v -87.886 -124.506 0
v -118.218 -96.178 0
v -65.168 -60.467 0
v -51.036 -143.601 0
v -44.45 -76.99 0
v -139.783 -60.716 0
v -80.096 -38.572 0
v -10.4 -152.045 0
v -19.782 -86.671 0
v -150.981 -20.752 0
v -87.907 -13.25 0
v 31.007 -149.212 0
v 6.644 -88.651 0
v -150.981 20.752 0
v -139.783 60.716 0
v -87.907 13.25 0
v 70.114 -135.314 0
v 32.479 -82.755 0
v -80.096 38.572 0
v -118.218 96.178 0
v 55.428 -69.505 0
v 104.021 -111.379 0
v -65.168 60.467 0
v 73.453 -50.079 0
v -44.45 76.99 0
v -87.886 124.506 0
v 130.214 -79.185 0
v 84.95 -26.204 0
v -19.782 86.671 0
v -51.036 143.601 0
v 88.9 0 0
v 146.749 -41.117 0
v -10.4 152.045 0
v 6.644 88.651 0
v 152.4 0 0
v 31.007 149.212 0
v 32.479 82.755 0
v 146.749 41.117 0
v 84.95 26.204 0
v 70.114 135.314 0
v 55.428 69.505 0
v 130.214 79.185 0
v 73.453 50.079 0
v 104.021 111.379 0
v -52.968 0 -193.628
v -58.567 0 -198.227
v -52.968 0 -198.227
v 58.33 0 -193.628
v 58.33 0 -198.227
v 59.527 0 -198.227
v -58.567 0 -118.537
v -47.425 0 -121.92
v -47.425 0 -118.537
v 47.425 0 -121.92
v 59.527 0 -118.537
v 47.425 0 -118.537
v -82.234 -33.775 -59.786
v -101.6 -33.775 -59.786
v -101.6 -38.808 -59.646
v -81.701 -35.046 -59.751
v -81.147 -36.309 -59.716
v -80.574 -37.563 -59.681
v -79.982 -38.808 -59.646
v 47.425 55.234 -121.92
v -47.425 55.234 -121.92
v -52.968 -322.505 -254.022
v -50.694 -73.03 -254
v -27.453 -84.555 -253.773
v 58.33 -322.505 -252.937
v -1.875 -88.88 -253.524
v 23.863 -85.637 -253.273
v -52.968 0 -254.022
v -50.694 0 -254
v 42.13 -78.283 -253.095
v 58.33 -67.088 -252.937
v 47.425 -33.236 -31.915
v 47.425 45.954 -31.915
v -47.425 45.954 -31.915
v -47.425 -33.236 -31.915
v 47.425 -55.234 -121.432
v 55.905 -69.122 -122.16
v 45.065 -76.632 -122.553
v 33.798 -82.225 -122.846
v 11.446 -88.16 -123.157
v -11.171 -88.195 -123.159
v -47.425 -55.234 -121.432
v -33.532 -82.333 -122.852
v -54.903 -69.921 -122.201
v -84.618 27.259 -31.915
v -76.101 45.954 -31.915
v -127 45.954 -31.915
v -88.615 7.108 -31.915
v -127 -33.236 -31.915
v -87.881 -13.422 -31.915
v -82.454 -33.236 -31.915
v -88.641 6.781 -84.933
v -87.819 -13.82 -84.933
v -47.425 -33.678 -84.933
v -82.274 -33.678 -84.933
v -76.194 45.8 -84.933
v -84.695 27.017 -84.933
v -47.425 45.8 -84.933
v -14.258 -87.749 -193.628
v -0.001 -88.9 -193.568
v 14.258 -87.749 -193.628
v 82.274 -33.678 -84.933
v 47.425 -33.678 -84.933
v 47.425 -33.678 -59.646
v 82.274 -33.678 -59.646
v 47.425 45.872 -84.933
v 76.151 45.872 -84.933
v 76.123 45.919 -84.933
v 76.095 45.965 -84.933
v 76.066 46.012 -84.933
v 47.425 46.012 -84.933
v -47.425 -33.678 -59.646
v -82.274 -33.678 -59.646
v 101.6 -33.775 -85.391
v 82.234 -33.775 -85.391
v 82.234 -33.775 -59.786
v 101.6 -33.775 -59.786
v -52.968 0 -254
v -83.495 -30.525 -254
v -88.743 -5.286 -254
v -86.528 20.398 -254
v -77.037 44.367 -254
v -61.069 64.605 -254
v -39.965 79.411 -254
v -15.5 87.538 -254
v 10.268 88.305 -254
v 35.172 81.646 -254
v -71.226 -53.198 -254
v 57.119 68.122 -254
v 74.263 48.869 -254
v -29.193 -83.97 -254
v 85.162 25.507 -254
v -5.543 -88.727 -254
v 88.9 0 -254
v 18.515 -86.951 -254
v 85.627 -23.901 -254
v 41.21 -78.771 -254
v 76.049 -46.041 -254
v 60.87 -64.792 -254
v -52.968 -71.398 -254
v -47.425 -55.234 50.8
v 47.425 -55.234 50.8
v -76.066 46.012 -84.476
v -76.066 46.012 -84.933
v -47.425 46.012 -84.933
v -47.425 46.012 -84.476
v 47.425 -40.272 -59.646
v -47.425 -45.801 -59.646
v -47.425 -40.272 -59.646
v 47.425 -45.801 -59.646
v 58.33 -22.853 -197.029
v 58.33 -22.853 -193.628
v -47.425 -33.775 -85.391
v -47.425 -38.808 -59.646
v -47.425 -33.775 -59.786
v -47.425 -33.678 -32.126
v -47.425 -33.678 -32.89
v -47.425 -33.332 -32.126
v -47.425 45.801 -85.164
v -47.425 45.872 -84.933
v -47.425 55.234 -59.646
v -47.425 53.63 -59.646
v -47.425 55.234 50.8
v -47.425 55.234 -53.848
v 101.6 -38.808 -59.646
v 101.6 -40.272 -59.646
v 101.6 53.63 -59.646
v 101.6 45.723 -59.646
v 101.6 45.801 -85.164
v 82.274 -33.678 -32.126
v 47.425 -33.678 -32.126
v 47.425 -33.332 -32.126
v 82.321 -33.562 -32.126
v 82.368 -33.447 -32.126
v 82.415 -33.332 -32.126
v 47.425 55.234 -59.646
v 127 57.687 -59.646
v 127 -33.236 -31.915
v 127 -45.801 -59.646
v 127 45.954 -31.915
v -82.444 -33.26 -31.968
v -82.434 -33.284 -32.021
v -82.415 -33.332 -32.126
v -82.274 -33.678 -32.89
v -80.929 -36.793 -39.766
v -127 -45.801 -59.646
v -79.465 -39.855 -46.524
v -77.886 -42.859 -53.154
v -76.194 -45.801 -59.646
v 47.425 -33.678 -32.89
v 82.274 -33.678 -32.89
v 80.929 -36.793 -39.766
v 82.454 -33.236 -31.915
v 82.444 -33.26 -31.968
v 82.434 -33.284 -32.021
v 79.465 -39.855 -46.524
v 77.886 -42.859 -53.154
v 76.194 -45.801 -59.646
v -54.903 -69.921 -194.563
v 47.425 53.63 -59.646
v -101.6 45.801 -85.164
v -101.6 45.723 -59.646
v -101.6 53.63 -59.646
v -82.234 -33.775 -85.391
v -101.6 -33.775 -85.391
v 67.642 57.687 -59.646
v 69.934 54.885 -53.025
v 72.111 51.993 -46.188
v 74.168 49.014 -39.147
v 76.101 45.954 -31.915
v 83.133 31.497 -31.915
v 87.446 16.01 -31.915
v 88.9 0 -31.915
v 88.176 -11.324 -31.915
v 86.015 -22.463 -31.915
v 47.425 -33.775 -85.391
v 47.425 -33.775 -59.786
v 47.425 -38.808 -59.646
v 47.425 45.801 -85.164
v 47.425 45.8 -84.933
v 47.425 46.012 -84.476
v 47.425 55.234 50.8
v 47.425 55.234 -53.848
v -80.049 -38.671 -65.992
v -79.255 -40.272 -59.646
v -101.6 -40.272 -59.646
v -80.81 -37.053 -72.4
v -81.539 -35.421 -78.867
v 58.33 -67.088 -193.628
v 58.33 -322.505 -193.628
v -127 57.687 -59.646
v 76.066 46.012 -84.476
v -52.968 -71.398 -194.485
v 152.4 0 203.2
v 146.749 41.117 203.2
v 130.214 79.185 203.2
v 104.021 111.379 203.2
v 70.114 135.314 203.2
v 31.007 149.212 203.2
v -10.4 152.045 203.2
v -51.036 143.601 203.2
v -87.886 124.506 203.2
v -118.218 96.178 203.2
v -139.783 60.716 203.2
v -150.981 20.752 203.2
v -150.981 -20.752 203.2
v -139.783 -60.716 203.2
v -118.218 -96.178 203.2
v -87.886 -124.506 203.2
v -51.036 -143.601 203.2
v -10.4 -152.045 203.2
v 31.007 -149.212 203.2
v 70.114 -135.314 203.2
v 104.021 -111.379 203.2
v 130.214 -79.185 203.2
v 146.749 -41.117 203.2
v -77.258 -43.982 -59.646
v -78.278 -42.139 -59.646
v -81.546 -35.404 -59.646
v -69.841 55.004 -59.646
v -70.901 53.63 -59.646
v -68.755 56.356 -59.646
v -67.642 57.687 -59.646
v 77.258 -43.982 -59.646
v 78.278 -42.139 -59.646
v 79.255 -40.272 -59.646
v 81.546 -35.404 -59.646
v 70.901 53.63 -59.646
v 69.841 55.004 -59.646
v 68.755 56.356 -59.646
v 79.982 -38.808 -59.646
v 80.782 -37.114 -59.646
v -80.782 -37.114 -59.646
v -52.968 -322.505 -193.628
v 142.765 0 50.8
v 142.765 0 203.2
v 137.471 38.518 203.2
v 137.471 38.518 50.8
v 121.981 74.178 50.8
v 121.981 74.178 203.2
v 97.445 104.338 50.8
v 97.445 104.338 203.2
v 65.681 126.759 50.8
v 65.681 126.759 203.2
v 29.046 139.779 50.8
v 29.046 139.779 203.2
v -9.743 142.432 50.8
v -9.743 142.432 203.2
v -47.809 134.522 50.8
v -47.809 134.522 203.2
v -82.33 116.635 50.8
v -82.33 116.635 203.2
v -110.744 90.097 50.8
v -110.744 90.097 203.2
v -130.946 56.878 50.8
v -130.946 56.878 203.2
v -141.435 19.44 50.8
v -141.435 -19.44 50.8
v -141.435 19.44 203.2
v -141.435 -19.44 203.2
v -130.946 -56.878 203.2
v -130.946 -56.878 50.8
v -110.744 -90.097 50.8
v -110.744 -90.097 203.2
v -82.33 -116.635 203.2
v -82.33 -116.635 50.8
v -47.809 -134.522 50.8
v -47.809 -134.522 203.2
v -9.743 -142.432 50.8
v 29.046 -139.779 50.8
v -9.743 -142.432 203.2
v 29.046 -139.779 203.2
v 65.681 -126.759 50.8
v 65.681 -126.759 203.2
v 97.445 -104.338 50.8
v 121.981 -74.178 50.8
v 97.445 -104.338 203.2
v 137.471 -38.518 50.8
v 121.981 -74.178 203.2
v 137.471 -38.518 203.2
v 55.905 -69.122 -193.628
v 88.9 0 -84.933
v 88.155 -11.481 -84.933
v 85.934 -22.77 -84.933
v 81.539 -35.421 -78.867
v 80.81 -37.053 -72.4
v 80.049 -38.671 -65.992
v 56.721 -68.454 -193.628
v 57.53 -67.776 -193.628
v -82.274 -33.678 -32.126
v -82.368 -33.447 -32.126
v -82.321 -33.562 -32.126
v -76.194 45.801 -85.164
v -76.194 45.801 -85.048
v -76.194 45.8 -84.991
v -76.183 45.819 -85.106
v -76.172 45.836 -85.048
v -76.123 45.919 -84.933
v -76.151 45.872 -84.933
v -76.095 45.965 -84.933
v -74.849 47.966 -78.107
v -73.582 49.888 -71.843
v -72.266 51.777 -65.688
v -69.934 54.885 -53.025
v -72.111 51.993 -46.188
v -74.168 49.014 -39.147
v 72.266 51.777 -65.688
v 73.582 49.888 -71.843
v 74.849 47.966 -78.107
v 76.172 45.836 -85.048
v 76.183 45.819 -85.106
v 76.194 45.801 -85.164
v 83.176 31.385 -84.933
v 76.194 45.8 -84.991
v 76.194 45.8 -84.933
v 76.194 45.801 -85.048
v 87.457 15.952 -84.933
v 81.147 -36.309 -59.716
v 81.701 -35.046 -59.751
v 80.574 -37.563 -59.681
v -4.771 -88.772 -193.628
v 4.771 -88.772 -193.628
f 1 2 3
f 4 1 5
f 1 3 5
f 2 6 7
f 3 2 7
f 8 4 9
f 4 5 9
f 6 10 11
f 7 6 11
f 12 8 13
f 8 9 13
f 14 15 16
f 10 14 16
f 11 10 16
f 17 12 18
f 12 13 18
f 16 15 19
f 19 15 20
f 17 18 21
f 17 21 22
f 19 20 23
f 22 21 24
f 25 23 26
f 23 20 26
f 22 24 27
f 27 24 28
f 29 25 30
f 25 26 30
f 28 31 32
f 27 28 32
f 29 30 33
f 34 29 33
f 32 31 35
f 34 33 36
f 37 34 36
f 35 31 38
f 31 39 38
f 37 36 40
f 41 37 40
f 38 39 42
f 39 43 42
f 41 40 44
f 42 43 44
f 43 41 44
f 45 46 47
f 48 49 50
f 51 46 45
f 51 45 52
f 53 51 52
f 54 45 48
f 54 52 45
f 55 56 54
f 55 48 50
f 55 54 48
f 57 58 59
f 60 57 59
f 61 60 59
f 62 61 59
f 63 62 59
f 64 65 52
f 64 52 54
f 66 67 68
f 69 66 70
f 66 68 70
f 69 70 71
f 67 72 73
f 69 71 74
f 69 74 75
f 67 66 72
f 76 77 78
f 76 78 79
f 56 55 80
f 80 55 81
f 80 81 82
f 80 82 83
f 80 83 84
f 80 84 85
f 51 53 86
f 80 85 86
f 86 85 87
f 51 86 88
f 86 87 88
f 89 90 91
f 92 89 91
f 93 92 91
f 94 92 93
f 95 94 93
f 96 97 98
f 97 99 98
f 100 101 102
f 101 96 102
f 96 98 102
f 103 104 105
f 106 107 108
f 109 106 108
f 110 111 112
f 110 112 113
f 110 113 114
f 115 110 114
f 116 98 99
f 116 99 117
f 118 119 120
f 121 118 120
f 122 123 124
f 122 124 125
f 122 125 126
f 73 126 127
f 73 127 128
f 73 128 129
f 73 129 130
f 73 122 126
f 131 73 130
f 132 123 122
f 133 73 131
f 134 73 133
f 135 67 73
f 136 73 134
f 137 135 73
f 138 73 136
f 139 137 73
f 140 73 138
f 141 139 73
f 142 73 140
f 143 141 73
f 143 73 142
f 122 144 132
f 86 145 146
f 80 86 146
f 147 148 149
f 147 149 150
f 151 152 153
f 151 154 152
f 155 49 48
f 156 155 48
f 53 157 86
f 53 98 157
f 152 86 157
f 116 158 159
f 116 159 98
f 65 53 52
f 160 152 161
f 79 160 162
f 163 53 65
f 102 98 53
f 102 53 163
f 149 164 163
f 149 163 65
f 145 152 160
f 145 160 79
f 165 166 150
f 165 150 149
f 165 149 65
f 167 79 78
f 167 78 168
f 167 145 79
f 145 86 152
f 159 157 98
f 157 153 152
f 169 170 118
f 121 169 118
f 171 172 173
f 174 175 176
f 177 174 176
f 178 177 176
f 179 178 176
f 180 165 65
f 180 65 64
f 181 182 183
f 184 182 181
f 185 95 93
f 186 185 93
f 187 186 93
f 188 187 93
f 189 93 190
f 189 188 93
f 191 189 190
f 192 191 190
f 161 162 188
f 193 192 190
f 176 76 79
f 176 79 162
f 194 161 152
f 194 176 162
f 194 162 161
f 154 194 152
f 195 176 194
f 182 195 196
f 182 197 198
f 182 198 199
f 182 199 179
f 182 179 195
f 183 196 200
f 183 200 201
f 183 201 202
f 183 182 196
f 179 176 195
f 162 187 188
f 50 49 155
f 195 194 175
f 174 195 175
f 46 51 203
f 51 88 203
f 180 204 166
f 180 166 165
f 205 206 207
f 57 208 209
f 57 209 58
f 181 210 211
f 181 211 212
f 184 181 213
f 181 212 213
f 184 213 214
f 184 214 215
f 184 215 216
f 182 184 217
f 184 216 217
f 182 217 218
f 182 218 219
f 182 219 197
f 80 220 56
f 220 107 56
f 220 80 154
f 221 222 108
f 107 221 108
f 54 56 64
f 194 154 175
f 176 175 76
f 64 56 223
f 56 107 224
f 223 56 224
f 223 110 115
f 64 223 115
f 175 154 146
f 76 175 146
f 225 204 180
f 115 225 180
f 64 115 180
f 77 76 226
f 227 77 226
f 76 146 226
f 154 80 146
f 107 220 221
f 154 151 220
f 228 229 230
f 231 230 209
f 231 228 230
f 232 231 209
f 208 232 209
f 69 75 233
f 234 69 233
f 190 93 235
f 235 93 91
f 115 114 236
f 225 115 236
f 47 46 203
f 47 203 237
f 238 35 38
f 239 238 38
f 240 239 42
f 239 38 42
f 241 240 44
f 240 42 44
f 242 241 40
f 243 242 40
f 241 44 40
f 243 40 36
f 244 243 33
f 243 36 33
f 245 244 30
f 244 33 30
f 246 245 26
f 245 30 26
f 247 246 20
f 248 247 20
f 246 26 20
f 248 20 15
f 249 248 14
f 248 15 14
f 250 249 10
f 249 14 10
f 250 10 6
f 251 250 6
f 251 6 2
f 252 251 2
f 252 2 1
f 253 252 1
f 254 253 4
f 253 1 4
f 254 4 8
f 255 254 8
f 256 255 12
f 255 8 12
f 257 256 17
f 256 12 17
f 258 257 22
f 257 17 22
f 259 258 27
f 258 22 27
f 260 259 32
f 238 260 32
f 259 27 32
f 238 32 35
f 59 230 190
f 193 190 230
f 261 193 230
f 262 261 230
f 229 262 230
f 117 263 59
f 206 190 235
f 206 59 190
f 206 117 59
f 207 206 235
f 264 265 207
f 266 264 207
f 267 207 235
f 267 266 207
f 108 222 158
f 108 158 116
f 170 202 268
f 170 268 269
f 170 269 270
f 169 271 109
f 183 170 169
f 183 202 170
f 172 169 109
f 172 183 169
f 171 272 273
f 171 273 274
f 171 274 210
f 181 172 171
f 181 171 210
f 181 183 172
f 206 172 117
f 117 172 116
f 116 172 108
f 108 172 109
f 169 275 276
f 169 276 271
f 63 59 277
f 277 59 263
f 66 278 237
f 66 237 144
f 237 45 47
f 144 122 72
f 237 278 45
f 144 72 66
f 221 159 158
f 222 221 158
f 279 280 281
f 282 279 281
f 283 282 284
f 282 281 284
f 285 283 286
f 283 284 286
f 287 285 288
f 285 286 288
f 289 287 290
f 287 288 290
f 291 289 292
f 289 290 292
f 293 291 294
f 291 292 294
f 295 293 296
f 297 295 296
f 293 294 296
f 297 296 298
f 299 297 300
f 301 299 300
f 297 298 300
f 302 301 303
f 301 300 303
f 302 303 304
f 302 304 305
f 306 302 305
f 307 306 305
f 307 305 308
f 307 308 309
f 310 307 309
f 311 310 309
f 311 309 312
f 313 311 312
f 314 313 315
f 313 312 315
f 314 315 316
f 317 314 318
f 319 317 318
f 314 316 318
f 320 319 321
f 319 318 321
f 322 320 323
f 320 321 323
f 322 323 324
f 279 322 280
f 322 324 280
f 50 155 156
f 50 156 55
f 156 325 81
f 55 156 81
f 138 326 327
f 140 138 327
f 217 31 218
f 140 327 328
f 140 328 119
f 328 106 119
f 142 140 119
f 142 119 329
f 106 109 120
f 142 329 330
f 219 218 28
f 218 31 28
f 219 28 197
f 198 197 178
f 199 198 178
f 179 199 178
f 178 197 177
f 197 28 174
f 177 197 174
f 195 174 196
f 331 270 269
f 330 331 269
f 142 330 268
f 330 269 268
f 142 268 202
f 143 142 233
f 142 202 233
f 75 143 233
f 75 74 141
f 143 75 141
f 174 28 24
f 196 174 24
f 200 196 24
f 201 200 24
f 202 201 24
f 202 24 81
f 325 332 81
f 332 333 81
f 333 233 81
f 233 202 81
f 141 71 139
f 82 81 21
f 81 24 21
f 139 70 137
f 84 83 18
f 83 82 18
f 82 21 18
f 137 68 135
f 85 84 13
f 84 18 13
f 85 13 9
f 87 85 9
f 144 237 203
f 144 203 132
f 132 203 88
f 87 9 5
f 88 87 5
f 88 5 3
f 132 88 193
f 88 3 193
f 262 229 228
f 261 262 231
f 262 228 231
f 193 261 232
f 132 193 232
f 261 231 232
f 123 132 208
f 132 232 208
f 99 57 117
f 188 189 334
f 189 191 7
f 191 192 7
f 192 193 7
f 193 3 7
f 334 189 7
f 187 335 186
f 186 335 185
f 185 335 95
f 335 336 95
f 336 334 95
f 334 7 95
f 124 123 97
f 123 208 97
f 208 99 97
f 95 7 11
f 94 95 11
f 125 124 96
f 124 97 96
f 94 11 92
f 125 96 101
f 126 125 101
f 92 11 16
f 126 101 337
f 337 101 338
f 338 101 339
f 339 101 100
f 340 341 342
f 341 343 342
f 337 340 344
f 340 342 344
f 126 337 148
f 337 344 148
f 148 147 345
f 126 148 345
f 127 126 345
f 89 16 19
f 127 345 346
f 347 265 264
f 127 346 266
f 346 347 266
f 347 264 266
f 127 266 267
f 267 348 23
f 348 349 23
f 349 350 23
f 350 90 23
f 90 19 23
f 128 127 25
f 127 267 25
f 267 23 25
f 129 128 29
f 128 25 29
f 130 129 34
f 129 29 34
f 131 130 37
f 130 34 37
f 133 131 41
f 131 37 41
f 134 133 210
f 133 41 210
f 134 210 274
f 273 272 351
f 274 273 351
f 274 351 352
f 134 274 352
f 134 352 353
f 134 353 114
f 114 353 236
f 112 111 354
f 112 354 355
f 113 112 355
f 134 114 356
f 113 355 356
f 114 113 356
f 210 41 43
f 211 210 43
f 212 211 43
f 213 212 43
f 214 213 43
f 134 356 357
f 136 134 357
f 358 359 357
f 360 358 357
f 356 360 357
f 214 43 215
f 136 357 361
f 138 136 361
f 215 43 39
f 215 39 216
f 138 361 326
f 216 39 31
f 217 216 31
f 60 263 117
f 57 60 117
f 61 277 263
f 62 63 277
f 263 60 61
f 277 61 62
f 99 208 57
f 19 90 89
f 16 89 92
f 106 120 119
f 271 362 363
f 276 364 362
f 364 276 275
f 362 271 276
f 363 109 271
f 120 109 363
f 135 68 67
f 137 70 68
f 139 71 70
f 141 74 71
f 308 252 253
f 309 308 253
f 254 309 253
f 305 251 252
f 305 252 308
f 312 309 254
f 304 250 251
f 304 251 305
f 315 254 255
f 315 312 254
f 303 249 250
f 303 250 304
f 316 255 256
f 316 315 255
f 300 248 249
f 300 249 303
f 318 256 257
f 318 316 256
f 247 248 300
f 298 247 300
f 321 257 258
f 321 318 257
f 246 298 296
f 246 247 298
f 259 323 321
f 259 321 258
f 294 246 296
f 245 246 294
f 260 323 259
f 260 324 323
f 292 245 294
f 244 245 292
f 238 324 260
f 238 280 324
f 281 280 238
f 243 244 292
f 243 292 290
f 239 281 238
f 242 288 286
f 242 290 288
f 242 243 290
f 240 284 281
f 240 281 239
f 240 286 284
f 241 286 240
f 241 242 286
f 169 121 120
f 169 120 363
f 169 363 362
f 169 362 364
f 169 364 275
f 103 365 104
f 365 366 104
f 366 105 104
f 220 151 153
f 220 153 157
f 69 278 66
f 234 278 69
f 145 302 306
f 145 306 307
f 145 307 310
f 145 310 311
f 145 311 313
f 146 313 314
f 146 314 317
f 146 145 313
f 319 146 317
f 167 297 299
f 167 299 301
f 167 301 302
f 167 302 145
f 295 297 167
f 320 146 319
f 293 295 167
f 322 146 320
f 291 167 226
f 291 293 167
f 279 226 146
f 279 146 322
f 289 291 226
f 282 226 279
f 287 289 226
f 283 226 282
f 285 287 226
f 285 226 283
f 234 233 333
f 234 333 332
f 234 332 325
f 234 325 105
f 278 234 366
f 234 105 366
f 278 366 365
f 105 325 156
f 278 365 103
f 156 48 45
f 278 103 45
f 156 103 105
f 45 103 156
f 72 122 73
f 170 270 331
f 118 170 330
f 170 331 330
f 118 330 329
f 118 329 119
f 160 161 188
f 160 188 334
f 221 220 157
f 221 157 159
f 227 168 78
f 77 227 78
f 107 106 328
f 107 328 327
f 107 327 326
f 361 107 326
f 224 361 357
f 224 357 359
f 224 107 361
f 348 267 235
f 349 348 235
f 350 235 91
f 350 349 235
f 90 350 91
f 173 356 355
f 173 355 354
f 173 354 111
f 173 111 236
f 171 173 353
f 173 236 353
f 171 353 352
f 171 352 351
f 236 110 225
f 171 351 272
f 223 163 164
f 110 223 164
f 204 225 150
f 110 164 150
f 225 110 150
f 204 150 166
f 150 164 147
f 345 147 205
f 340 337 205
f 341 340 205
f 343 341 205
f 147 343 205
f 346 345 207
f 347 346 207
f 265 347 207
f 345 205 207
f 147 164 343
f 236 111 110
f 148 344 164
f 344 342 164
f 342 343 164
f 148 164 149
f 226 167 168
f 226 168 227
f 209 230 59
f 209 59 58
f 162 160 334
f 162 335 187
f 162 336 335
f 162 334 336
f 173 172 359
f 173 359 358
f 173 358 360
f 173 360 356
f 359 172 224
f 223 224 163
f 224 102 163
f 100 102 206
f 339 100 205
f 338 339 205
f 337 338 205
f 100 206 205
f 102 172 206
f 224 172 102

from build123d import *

# Parameters (mm, degrees)
F0_R           = 152.4
F1_DEPTH       = 203.2
F2_R           = 88.9
F3_DEPTH       = 254
F4_W           = 118.0947571993
F4_H           = 79.6899646521
F5_DEPTH       = 152.4
F5_TAPER       = 3
F6_W           = 94.8493182659
F6_H           = 110.4671433568
F7_DEPTH       = 325.12
F8_R           = 142.764871417
F9_DEPTH       = 152.4
F10_W          = 79.6899646521
F10_H          = 52.806597203
F11_DEPTH      = 101.6
F11_DEPTH_BACK = 101.6
F13_DEPTH      = 127
F13_DEPTH_BACK = 127
F15_DEPTH      = 101.6
F15_DEPTH_BACK = 101.6
F17_DEPTH      = 322.505


with BuildPart() as f1:
    # F0 (on Top) → F1 (new body)
    with BuildSketch(Plane.XY):
        Circle(F0_R)
    extrude(amount=F1_DEPTH)

    # F2 (on face) → F3 (join)
    with BuildSketch(Plane(origin=(0, 0, 0), x_dir=(1, 0, 0), z_dir=(0, 0, -1))):
        Circle(F2_R)
    extrude(amount=F3_DEPTH)

    # F4 (on Front) → F5 (cut)
    with BuildSketch(Plane.XZ):
        with Locations((0.4800595343, -158.3820804954)):
            Rectangle(F4_W, F4_H)
    extrude(amount=F5_DEPTH, taper=F5_TAPER, mode=Mode.SUBTRACT)

    # F6 (on face) → F7 (cut)
    with BuildSketch(Plane.XY.offset(203.2)):
        Rectangle(F6_W, F6_H)
    extrude(amount=-F7_DEPTH, mode=Mode.SUBTRACT)

    # F8 (on face) → F9 (cut)
    with BuildSketch(Plane.XY.offset(203.2)):
        Circle(F8_R)
    extrude(amount=-F9_DEPTH, mode=Mode.SUBTRACT)

    # F10 (on Right) → F11 (cut, two sides)
    with BuildSketch(Plane.YZ) as f11_sk:
        with Locations((6.1672367156, -58.5296023637)):
            Rectangle(F10_W, F10_H)
    extrude(amount=F11_DEPTH, mode=Mode.SUBTRACT)
    extrude(f11_sk.sketch, amount=-F11_DEPTH_BACK, mode=Mode.SUBTRACT)

    # F12 (on Right) → F13 (join, two sides)
    with BuildSketch(Plane.YZ) as f13_sk:
        Polygon((45.9540584598, -31.9147333503), (-33.2359305319, -31.9147333503), (-45.800998807, -59.6464499831), (57.6868057251, -59.6464499831), align=None)
    extrude(amount=F13_DEPTH)
    extrude(f13_sk.sketch, amount=-F13_DEPTH_BACK)

    # F14 (on Right) → F15 (join, two sides)
    with BuildSketch(Plane.YZ) as f15_sk:
        Polygon((-33.7745137513, -59.7862656422), (-40.2827188373, -59.6054829657), (-33.7745137513, -85.3911563754), align=None)
        Polygon((53.6378957331, -59.6221797168), (45.722966075, -59.6221797168), (45.800998807, -85.1639956236), align=None)
    extrude(amount=F15_DEPTH)
    extrude(f15_sk.sketch, amount=-F15_DEPTH_BACK)

    # F16 (on Front) → F17 (join)
    with BuildSketch(Plane.XZ):
        Polygon((58.3297610283, -193.6283260584), (-52.9678873718, -193.6283260584), (-52.9678873718, -254.0221810341), (58.3297610283, -252.9366910458), align=None)
    extrude(amount=F17_DEPTH)


solid = f1.part
